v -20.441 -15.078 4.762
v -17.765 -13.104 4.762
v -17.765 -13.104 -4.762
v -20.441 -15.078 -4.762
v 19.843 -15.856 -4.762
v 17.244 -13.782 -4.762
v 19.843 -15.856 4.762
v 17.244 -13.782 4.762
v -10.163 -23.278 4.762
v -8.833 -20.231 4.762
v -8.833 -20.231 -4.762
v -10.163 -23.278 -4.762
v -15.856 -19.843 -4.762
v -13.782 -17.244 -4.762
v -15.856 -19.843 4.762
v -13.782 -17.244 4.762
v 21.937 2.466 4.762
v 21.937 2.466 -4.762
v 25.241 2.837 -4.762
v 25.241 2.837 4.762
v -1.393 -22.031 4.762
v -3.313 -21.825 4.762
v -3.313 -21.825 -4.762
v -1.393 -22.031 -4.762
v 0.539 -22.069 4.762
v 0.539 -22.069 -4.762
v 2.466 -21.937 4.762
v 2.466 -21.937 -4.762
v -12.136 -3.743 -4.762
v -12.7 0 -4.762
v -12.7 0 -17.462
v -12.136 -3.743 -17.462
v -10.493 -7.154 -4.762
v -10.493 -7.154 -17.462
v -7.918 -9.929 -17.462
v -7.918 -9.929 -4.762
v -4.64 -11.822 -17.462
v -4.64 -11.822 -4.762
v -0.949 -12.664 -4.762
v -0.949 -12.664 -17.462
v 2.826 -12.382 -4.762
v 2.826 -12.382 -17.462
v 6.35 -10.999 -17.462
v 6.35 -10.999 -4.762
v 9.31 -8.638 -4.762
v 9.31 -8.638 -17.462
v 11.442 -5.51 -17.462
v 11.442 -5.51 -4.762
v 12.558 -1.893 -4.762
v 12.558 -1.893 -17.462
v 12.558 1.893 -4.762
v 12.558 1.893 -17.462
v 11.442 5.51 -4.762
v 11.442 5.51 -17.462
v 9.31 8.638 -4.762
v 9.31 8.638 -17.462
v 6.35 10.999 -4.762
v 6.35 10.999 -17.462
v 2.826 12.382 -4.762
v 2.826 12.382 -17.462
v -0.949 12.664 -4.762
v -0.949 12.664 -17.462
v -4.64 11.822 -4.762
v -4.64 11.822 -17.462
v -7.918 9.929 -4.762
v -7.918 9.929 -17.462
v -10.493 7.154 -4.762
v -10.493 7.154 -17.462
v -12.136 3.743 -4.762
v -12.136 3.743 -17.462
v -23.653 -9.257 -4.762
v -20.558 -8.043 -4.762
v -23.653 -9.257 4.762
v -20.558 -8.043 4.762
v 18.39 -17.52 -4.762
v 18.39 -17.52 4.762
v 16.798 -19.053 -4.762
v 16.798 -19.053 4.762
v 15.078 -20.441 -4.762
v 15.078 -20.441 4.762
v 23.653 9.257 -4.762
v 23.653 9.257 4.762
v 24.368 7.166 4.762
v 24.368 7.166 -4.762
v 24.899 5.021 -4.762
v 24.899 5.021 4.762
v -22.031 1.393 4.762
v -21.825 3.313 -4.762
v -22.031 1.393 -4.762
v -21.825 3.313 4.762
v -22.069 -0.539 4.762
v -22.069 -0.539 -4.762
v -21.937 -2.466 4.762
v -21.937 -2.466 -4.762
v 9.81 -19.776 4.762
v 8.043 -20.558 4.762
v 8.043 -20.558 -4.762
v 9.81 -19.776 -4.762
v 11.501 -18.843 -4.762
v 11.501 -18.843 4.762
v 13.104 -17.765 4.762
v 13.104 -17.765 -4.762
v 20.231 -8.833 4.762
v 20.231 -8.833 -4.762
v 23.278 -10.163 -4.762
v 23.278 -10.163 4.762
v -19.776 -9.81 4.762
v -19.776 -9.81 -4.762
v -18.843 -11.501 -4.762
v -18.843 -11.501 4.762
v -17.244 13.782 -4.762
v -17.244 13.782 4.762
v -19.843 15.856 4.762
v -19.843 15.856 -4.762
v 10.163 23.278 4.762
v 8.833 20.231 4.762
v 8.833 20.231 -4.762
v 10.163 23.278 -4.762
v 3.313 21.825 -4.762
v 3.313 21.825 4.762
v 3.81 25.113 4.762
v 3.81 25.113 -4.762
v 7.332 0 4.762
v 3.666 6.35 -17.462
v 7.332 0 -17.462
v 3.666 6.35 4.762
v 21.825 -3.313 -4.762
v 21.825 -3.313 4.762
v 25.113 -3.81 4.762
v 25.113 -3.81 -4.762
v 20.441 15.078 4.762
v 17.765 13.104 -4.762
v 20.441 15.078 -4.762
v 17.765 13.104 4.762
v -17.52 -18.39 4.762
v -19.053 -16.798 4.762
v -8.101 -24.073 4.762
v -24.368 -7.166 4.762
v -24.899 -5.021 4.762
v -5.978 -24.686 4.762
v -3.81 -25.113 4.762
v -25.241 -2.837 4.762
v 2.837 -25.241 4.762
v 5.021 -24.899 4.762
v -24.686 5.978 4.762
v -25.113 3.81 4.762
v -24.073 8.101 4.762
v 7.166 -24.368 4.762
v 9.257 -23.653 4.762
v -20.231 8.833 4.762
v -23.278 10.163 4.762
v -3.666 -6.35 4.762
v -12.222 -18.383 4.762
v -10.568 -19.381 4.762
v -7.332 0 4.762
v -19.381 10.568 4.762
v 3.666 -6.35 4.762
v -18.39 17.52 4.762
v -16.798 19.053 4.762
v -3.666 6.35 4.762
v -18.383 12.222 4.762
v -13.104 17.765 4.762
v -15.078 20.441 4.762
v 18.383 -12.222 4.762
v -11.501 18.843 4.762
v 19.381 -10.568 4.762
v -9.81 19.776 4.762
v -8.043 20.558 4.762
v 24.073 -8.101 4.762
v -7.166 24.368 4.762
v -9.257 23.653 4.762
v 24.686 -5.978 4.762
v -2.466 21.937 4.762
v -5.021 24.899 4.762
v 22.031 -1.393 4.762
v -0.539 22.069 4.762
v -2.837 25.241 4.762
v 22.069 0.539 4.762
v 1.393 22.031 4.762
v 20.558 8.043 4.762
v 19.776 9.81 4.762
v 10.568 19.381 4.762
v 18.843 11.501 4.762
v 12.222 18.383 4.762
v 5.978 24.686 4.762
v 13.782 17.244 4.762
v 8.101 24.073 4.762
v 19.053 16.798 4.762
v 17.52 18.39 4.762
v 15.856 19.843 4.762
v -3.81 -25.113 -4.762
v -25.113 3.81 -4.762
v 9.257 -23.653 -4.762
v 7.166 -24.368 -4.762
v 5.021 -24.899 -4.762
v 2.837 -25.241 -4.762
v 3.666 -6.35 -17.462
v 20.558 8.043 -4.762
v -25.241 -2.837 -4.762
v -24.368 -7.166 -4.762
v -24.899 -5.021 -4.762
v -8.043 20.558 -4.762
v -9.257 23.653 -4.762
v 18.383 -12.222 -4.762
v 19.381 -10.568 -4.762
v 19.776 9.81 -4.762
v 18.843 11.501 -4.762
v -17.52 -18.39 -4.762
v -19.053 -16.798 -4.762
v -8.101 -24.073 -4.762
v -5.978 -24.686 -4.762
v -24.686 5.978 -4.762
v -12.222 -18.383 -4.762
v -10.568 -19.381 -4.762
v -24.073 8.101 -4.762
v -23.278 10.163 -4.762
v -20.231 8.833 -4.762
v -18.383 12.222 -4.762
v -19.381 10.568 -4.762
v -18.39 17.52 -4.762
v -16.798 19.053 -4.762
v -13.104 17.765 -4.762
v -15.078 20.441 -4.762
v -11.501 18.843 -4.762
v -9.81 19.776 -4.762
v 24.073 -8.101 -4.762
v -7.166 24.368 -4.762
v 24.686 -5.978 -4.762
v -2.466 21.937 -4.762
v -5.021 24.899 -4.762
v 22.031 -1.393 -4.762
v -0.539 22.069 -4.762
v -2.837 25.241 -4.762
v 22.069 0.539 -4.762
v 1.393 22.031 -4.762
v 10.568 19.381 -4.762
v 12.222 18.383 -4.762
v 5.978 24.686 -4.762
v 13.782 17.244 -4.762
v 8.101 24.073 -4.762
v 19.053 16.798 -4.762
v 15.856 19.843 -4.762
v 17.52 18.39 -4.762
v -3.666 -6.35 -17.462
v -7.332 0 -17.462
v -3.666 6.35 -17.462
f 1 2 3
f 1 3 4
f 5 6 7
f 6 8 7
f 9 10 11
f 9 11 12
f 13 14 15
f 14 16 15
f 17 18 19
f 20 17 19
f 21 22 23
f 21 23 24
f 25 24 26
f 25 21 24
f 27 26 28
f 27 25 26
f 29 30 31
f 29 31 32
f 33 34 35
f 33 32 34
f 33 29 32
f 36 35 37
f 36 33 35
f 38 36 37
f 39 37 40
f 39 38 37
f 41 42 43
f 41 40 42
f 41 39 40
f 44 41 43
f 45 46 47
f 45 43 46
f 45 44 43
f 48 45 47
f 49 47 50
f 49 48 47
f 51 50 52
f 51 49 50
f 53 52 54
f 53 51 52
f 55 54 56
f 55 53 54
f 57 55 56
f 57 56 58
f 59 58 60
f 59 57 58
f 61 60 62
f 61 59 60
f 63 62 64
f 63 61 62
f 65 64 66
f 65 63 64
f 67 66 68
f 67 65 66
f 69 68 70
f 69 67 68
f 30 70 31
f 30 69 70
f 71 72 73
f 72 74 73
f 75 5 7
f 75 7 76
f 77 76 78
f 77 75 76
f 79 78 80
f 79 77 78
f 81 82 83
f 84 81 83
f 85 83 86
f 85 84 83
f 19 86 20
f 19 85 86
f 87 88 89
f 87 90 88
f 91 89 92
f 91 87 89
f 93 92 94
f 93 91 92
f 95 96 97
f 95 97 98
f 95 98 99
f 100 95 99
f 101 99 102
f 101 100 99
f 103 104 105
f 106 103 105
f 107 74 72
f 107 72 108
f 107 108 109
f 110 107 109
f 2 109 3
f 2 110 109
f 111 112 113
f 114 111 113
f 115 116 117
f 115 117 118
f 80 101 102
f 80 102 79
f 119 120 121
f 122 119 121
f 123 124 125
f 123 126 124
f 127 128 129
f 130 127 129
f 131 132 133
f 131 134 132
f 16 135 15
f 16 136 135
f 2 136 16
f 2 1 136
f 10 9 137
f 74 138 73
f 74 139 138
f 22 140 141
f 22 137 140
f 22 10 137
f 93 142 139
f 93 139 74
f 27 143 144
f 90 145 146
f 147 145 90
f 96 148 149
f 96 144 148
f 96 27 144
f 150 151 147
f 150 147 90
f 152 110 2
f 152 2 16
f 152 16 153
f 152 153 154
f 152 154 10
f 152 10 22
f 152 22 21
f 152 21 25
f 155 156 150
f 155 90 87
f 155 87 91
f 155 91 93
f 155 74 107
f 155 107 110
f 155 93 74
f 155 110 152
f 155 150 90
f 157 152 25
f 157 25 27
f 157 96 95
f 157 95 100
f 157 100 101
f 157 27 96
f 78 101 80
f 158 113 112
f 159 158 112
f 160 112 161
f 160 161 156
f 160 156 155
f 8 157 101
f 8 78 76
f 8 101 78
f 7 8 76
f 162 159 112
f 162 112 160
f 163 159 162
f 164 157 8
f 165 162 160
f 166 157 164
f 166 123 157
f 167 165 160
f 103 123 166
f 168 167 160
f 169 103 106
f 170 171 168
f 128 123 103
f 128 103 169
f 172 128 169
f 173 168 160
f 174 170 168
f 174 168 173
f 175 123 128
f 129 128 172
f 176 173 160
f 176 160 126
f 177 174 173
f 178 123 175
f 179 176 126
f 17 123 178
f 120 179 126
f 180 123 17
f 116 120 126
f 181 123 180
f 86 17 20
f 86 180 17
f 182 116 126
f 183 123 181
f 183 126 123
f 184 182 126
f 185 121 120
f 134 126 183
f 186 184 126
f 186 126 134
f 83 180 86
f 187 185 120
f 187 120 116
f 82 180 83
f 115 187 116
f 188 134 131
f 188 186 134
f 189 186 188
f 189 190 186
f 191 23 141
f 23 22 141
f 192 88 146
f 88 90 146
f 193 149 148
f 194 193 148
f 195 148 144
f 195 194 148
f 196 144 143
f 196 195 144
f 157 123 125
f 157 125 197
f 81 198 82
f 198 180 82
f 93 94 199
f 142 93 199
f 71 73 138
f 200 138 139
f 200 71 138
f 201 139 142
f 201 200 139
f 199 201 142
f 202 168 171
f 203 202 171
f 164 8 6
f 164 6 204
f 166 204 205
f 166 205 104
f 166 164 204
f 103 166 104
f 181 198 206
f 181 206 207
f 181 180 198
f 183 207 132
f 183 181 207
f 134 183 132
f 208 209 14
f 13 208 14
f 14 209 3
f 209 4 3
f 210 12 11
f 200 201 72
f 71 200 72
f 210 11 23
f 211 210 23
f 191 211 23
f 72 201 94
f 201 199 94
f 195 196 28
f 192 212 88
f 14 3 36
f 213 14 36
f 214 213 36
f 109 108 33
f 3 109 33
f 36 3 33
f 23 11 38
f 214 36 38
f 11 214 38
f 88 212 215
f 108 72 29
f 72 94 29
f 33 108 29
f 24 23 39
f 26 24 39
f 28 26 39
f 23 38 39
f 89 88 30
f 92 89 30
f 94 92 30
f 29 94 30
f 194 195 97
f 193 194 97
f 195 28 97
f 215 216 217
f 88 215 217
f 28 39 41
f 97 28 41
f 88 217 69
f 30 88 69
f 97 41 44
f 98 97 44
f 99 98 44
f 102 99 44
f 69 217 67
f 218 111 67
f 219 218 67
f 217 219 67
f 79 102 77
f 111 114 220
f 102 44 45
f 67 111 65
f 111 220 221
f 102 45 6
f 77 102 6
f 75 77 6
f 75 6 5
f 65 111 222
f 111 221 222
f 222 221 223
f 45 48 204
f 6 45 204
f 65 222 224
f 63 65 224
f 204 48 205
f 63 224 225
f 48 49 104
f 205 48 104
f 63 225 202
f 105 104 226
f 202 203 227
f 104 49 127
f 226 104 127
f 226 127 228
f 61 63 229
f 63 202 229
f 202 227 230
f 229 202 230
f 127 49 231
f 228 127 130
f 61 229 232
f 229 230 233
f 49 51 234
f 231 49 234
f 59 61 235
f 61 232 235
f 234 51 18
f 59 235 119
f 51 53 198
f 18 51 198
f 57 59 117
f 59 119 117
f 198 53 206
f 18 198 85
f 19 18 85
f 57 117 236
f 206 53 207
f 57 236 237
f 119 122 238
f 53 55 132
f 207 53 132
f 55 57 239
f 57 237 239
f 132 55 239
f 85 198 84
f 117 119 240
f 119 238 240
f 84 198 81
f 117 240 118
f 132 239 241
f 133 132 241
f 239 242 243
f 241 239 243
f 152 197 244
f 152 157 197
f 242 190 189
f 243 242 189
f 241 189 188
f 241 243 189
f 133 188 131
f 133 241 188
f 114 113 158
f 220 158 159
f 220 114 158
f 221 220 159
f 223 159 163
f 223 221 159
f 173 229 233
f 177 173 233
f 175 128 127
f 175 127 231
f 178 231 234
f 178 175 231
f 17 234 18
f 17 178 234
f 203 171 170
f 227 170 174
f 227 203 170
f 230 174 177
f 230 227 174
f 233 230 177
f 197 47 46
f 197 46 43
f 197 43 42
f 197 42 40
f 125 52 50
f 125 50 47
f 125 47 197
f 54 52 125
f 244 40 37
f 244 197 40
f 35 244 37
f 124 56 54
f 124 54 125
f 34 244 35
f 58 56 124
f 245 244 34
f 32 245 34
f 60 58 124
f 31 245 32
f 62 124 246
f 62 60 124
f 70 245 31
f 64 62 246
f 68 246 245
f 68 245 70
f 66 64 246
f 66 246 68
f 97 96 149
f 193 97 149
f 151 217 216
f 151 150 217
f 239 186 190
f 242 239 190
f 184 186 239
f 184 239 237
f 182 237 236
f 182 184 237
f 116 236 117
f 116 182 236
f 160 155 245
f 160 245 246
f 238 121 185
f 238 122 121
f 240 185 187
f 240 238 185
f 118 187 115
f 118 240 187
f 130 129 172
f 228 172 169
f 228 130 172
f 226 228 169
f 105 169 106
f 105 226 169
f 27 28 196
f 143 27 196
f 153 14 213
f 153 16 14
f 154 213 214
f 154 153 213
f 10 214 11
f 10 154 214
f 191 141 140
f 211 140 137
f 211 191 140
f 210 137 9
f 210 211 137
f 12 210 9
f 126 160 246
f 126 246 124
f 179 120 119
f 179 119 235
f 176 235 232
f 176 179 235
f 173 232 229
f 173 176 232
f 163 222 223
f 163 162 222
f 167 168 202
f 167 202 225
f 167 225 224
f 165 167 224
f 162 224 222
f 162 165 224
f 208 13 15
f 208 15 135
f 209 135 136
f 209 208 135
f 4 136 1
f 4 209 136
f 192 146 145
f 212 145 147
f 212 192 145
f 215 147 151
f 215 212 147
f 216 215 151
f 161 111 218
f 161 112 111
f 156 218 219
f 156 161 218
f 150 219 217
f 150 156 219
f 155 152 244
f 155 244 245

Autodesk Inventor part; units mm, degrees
ref_plane "YZ Plane" through (0, 0, 0) normal (1, 0, 0) x (0, 1, 0)
ref_plane "XZ Plane" through (0, 0, 0) normal (0, 1, 0) x (-1, 0, 0)
ref_plane "XY Plane" through (0, 0, 0) normal (0, 0, 1) x (1, 0, 0)
sketch "Sketch1" plane through (0, 0, 0) normal (0, 0, 1) x (1, 0, 0)
  circle A0 centre (0, 0) radius 25.4
  dimension "d0" = 50.8
extrude "Extrusion1" add sketch "Sketch1" along normal mid plane 9.525
sketch "Sketch3" plane through (0, 0, 4.7625) normal (0, 0, 1) x (1, 0, 0)
  circle A0 centre (0, 0) radius 25.4 projected
  line L0 (-2.8374, 21.892) -> (-2.8374, 21.8722)
  arc A1 (3.8096, 25.1127) -> (-2.8374, 25.241) centre (0, 0) ccw
  arc A2 (3.3133, 21.8251) -> (-2.466, 21.937) centre (0, 0) ccw
  line L1 (3.3133, 21.8251) -> (3.8096, 25.1127)
  line L2 (-2.466, 21.937) -> (-2.8374, 25.241)
  dimension "d17" = 3.3249
  dimension "d24" = 15
extrude "Extrusion4" cut sketch "Sketch3" against normal blind 9.525 contours L1 A2 L2 A0 picked at (-1.9747, 24.1901)
pattern_circular "Circular Pattern2" count 12 over 360 about axis through (0, 0, -10) along (0, 0, 1) of "Extrusion4"
sketch "Sketch4" plane through (0, 0, -4.7625) normal (0, 0, -1) x (-1, 0, 0)
  circle A0 centre (0, 0) radius 12.7
  dimension "d27" = 25.4
extrude "Extrusion5" add sketch "Sketch4" along normal blind 12.7
sketch "Sketch2" plane through (0, 0, 4.7625) normal (0, 0, 1) x (1, 0, 0)
  line L0 (7.3323, 0) -> (3.6662, -6.35)
  line L1 (3.6662, -6.35) -> (-3.6662, -6.35)
  line L2 (-3.6662, -6.35) -> (-7.3323, 0)
  line L3 (-7.3323, 0) -> (-3.6662, 6.35)
  line L4 (-3.6662, 6.35) -> (3.6662, 6.35)
  line L5 (3.6662, 6.35) -> (7.3323, 0)
  point P0 (0, 0)
  point P1 (0, 0)
  dimension "d23" = 12.7
extrude "Extrusion2" cut sketch "Sketch2" against normal through all
equation "\"d0\" = externalDiameter"
equation "\"d1\" = thickness"
equation "\"d17\" = heightOfSpline"
equation "\"d18\" = thickness"
equation "\"d23\" = shaftHexSize"
equation "\"externalDiameter\" = 50.8"
equation "\"thickness\" = 9.525"
equation "\"shaftHexSize\" = 12.7"
equation "\"pi\" = 3.141593"
equation "\"heightOfSpline\" = 3.324852"
properties part number "centerPartOfLock" material "PC/ABS Plastic"
